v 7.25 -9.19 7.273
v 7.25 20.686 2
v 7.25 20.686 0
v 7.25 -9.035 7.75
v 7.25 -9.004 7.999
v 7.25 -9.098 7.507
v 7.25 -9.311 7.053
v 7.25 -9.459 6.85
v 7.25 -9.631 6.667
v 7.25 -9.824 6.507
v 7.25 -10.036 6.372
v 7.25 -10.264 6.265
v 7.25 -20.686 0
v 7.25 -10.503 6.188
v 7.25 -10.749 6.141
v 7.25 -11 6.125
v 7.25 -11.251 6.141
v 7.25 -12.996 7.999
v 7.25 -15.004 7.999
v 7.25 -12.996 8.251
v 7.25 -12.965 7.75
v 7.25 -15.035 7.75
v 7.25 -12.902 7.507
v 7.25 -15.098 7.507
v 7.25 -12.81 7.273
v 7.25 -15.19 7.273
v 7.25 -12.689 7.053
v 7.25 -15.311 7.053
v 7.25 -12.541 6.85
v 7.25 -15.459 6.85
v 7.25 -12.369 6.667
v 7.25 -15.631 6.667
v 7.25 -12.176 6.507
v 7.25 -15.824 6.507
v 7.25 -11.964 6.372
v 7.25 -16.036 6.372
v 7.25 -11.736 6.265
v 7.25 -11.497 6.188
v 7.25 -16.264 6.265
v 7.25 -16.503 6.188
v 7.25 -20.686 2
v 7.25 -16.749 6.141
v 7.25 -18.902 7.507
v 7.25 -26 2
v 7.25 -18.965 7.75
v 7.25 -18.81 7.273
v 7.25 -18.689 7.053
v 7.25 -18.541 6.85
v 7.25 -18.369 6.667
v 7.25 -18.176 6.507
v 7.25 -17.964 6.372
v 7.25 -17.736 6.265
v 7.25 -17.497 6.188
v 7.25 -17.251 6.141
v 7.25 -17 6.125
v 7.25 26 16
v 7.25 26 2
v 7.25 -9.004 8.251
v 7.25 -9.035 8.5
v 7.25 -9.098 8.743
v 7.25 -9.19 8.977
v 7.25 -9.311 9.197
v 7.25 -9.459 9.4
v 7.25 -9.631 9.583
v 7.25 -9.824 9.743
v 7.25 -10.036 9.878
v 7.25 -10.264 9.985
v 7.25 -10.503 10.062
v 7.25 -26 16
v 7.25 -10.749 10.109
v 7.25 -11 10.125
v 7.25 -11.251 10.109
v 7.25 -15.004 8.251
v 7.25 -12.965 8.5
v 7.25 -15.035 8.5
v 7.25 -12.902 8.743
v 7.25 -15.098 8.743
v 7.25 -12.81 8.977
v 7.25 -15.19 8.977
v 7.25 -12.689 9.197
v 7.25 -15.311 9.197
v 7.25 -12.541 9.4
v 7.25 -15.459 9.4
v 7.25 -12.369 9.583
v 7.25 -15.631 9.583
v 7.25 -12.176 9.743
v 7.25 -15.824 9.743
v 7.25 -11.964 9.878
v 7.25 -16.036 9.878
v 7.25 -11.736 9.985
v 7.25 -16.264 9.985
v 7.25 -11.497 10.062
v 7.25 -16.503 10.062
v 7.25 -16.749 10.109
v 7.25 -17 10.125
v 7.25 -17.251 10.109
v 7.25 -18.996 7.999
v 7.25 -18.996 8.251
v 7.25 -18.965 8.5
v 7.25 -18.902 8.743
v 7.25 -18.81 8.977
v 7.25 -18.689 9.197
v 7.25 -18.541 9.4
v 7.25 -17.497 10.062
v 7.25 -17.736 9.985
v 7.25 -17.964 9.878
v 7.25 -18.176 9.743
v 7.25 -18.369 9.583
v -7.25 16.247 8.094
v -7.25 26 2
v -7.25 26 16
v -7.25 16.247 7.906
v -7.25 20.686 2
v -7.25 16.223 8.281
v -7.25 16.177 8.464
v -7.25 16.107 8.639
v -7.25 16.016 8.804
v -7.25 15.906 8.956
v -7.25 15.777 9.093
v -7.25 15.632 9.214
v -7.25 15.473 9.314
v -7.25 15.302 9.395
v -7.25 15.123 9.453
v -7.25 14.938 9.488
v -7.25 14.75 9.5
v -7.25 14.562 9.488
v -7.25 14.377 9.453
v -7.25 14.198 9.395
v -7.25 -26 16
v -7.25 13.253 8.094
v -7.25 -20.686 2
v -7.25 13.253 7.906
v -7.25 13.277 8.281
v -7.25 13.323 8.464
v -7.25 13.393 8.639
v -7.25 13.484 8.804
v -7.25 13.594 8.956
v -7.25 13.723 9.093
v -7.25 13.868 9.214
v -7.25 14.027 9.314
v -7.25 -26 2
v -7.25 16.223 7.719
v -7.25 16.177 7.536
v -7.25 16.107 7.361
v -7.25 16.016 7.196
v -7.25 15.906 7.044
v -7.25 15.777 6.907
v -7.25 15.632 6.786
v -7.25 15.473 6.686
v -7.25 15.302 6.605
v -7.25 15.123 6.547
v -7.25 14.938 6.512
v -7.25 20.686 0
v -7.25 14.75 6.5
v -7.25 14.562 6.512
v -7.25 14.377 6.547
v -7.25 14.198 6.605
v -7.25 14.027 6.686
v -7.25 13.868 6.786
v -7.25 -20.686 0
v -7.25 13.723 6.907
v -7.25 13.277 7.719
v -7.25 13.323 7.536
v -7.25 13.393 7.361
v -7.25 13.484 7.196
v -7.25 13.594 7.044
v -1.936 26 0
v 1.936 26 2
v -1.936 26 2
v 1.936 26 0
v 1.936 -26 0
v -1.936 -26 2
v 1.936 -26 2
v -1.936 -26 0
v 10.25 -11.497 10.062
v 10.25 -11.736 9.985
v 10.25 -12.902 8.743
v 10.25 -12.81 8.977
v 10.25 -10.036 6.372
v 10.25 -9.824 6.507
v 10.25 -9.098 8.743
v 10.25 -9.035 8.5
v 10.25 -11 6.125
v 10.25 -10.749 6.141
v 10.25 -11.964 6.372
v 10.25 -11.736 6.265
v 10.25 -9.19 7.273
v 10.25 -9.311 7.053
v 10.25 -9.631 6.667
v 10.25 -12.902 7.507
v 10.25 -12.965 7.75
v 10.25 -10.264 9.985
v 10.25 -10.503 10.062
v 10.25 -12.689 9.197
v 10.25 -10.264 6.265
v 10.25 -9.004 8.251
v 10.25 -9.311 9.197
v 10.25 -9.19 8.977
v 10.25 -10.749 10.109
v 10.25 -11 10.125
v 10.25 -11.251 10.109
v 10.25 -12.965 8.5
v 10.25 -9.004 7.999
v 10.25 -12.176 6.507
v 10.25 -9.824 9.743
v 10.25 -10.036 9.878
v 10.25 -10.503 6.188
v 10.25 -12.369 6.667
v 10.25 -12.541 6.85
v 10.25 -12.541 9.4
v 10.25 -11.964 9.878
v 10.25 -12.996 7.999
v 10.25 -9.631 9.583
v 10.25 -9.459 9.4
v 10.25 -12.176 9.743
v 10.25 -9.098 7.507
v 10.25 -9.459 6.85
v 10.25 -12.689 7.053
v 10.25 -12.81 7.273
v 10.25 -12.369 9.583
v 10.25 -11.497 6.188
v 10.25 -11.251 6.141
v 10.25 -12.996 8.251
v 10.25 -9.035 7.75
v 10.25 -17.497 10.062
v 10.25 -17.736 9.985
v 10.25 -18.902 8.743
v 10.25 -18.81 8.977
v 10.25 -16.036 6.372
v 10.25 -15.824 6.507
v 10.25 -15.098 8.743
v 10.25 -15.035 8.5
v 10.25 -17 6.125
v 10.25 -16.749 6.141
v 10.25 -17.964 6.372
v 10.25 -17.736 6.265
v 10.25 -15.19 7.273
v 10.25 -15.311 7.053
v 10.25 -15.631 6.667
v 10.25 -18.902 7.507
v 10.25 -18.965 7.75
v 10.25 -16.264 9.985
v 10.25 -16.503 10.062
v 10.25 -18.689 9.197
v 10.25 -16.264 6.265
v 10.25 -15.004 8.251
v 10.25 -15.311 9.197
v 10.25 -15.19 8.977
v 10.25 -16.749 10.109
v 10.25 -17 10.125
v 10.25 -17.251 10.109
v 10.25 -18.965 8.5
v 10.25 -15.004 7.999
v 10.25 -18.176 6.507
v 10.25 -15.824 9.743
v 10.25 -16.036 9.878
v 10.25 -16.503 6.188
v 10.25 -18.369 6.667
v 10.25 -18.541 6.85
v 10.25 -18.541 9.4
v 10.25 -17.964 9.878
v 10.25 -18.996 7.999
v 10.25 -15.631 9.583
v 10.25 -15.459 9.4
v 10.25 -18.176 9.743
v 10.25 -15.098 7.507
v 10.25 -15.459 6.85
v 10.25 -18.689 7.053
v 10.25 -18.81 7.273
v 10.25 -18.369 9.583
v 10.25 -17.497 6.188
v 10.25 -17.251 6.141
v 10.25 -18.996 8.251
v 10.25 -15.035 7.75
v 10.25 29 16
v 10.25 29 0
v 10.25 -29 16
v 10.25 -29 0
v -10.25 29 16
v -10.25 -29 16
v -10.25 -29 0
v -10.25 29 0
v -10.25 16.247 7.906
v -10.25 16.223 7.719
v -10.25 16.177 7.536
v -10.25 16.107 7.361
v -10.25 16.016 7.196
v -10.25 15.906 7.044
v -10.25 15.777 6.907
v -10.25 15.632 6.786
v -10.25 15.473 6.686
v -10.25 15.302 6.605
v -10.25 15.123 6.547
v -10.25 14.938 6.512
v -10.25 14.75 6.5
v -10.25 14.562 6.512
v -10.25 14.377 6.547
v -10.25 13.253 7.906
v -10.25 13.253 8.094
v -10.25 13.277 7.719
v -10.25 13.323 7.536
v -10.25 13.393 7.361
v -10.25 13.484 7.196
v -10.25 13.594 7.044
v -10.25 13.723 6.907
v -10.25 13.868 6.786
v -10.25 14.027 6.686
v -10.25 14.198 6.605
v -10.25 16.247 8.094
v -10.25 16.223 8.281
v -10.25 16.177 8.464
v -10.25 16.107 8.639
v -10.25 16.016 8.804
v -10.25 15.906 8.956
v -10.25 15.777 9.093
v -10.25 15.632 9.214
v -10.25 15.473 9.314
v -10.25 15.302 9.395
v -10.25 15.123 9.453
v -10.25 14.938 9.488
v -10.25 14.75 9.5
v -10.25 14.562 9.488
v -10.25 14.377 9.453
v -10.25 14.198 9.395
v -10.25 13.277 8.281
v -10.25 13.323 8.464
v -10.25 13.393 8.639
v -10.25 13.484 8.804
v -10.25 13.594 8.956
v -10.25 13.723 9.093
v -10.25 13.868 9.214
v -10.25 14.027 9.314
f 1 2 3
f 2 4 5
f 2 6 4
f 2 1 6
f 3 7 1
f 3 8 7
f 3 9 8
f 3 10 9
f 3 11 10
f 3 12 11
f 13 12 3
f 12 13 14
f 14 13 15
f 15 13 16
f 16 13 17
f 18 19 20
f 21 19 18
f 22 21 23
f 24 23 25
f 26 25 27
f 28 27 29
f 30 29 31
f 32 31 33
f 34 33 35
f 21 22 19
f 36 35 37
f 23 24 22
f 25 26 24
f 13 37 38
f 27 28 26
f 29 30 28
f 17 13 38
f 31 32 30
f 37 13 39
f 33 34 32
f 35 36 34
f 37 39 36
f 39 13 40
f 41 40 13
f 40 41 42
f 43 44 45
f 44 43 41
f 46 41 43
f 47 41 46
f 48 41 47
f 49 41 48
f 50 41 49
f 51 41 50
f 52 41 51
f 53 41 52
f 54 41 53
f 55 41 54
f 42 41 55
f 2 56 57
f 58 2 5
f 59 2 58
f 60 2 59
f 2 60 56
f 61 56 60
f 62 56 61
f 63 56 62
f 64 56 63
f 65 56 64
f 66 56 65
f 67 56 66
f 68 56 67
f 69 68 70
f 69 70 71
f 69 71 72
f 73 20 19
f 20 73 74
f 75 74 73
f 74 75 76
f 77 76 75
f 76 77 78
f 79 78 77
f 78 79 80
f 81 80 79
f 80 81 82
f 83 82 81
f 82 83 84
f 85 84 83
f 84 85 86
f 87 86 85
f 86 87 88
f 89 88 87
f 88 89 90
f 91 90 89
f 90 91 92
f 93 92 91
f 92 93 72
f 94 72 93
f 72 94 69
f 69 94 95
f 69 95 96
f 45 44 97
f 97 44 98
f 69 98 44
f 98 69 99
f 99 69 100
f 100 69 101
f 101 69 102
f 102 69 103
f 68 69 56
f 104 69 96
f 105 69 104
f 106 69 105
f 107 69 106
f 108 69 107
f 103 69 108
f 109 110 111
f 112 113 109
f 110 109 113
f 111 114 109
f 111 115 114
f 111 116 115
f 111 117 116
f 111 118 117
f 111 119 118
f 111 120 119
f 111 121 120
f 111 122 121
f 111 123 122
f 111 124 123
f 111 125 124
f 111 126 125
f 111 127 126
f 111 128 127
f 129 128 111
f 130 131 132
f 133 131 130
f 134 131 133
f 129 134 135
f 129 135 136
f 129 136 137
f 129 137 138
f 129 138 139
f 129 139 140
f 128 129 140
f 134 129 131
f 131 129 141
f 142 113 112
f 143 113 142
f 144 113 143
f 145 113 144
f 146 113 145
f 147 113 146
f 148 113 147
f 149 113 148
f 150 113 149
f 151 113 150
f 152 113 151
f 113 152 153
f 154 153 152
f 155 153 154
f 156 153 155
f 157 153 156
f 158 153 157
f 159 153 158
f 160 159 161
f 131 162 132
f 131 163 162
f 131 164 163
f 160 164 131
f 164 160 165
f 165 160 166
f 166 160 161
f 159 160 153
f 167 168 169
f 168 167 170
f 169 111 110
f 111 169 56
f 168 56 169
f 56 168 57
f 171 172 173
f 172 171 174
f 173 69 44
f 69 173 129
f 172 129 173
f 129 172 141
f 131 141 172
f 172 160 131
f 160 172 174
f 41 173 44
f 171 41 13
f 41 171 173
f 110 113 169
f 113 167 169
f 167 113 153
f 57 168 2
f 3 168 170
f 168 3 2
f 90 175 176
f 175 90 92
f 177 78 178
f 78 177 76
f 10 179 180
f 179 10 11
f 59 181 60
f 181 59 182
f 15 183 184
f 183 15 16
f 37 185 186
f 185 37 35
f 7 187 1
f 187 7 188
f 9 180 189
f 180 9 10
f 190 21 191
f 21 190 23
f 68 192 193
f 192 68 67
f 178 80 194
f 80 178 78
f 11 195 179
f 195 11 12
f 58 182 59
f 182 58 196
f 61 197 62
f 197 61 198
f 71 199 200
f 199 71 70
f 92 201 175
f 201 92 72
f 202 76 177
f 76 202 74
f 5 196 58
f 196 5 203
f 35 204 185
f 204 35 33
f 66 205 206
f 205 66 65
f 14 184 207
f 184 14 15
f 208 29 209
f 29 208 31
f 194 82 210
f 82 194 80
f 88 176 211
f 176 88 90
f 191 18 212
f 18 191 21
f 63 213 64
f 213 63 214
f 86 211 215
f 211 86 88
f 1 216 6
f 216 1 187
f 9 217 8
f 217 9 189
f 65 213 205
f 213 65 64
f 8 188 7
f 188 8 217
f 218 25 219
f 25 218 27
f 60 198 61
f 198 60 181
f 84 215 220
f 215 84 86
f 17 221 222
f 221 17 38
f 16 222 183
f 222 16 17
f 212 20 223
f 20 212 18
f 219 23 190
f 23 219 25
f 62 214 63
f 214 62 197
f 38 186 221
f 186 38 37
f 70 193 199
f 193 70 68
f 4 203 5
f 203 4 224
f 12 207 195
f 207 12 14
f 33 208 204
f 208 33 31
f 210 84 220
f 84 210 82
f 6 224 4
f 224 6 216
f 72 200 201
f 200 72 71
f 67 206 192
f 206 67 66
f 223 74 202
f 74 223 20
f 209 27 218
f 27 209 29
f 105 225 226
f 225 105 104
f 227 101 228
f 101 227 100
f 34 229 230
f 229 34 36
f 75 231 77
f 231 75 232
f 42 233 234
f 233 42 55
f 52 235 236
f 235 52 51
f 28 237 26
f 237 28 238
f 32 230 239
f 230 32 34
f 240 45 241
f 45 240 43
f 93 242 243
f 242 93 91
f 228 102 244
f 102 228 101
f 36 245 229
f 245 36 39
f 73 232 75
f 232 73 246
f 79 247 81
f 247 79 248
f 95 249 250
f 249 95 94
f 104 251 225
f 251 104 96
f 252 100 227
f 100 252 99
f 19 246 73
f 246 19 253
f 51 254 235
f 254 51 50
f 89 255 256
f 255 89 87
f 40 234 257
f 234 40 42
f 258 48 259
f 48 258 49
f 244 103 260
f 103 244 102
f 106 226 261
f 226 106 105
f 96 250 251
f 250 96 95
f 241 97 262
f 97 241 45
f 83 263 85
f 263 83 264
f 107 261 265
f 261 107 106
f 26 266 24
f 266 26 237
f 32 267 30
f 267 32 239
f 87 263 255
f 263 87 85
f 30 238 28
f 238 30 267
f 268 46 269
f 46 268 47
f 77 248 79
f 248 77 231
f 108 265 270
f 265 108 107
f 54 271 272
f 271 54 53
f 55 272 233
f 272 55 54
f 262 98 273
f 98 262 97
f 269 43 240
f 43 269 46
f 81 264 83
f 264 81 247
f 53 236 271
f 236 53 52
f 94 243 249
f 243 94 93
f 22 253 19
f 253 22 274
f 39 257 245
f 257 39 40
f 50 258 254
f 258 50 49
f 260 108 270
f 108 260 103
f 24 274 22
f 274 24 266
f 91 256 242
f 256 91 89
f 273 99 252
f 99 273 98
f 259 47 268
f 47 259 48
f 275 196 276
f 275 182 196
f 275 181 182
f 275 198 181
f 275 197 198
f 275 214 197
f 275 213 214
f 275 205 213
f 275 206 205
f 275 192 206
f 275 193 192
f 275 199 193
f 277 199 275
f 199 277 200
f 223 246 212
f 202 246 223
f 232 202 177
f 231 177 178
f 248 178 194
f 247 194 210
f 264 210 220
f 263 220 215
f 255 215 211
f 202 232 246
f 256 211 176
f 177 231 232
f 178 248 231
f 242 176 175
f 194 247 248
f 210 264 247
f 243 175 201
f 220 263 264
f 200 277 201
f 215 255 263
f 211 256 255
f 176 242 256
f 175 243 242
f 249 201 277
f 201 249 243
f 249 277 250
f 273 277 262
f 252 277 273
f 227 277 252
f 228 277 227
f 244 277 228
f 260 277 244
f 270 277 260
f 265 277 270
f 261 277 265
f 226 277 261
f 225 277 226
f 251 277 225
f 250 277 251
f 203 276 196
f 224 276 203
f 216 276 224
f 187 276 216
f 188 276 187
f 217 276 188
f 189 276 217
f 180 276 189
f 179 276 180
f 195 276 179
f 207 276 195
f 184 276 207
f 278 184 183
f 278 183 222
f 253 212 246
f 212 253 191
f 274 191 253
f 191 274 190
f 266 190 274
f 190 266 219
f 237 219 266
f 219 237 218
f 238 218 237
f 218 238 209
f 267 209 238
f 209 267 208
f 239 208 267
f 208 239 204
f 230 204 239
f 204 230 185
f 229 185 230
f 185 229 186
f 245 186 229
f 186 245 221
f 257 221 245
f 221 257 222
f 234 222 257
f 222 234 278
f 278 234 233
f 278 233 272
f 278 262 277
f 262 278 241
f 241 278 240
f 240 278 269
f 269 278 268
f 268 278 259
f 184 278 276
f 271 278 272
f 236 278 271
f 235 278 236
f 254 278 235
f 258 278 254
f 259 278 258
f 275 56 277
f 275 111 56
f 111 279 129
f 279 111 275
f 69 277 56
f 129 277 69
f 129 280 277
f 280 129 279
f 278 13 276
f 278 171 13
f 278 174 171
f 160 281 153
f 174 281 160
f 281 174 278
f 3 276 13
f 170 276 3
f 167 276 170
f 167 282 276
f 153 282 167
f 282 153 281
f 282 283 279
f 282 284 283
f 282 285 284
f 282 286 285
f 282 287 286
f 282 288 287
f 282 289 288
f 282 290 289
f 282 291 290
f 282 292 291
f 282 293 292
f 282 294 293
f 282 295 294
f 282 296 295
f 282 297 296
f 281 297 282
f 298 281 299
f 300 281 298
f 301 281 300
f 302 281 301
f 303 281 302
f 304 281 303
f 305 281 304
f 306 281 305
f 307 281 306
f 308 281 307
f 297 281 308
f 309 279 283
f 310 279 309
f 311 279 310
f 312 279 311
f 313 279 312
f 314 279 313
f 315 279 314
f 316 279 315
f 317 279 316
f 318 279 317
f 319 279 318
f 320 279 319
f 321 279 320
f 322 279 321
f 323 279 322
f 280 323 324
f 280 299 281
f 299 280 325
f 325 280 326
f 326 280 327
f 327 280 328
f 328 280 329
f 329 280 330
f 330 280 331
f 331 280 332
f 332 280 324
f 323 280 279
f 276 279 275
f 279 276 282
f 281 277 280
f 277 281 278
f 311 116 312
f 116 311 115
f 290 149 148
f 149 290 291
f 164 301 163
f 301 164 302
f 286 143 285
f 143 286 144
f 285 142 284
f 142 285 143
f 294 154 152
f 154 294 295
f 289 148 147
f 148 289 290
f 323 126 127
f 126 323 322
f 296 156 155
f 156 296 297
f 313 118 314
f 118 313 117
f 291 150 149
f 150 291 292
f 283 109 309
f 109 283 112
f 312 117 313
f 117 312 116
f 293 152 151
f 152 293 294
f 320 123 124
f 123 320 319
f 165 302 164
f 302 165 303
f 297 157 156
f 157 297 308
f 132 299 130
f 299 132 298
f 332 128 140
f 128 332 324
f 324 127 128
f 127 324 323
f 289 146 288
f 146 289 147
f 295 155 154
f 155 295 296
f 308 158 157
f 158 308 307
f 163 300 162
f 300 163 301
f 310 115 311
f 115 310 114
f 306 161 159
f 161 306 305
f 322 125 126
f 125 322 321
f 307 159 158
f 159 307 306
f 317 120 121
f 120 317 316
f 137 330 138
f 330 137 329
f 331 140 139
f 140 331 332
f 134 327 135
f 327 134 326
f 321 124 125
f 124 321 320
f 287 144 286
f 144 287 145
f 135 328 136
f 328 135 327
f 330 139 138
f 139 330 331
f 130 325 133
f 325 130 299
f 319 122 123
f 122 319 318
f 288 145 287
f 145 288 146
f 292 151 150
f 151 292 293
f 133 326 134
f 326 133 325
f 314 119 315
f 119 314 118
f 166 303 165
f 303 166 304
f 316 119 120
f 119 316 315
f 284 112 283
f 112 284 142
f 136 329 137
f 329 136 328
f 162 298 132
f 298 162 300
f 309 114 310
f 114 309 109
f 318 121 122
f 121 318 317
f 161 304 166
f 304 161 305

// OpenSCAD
//translate([-10.25,-16,0]) #import("block.stl");
module spacer(length=32) {
translate([0,0,8]) {
difference() {
cube([20.5,length,16],center=true);
difference() {
cube([14.5,length-6,17],center=true);
translate([-10.25,-length/2,-8])rotate(45) cube([16,16,4],center=true);
translate([10.25,-length/2,-8])rotate(45) cube([16,16,4],center=true);
translate([-10.25,length/2,-8])rotate(45) cube([16,16,4],center=true);
translate([10.25,length/2,-8])rotate(45) cube([16,16,4],center=true);
}
translate([-10,length/2-14.25,0]) rotate([0,90,0]) cylinder(r=1.5,h=10,center=true);
translate([10,18-length/2,0.125]) {
rotate([0,90,0]) cylinder(r=2,h=10,center=true);
translate([0,-6,0]) rotate([0,90,0]) cylinder(r=2,h=10,center=true);
}
}
}
}

spacer(58);
$fn=50;
